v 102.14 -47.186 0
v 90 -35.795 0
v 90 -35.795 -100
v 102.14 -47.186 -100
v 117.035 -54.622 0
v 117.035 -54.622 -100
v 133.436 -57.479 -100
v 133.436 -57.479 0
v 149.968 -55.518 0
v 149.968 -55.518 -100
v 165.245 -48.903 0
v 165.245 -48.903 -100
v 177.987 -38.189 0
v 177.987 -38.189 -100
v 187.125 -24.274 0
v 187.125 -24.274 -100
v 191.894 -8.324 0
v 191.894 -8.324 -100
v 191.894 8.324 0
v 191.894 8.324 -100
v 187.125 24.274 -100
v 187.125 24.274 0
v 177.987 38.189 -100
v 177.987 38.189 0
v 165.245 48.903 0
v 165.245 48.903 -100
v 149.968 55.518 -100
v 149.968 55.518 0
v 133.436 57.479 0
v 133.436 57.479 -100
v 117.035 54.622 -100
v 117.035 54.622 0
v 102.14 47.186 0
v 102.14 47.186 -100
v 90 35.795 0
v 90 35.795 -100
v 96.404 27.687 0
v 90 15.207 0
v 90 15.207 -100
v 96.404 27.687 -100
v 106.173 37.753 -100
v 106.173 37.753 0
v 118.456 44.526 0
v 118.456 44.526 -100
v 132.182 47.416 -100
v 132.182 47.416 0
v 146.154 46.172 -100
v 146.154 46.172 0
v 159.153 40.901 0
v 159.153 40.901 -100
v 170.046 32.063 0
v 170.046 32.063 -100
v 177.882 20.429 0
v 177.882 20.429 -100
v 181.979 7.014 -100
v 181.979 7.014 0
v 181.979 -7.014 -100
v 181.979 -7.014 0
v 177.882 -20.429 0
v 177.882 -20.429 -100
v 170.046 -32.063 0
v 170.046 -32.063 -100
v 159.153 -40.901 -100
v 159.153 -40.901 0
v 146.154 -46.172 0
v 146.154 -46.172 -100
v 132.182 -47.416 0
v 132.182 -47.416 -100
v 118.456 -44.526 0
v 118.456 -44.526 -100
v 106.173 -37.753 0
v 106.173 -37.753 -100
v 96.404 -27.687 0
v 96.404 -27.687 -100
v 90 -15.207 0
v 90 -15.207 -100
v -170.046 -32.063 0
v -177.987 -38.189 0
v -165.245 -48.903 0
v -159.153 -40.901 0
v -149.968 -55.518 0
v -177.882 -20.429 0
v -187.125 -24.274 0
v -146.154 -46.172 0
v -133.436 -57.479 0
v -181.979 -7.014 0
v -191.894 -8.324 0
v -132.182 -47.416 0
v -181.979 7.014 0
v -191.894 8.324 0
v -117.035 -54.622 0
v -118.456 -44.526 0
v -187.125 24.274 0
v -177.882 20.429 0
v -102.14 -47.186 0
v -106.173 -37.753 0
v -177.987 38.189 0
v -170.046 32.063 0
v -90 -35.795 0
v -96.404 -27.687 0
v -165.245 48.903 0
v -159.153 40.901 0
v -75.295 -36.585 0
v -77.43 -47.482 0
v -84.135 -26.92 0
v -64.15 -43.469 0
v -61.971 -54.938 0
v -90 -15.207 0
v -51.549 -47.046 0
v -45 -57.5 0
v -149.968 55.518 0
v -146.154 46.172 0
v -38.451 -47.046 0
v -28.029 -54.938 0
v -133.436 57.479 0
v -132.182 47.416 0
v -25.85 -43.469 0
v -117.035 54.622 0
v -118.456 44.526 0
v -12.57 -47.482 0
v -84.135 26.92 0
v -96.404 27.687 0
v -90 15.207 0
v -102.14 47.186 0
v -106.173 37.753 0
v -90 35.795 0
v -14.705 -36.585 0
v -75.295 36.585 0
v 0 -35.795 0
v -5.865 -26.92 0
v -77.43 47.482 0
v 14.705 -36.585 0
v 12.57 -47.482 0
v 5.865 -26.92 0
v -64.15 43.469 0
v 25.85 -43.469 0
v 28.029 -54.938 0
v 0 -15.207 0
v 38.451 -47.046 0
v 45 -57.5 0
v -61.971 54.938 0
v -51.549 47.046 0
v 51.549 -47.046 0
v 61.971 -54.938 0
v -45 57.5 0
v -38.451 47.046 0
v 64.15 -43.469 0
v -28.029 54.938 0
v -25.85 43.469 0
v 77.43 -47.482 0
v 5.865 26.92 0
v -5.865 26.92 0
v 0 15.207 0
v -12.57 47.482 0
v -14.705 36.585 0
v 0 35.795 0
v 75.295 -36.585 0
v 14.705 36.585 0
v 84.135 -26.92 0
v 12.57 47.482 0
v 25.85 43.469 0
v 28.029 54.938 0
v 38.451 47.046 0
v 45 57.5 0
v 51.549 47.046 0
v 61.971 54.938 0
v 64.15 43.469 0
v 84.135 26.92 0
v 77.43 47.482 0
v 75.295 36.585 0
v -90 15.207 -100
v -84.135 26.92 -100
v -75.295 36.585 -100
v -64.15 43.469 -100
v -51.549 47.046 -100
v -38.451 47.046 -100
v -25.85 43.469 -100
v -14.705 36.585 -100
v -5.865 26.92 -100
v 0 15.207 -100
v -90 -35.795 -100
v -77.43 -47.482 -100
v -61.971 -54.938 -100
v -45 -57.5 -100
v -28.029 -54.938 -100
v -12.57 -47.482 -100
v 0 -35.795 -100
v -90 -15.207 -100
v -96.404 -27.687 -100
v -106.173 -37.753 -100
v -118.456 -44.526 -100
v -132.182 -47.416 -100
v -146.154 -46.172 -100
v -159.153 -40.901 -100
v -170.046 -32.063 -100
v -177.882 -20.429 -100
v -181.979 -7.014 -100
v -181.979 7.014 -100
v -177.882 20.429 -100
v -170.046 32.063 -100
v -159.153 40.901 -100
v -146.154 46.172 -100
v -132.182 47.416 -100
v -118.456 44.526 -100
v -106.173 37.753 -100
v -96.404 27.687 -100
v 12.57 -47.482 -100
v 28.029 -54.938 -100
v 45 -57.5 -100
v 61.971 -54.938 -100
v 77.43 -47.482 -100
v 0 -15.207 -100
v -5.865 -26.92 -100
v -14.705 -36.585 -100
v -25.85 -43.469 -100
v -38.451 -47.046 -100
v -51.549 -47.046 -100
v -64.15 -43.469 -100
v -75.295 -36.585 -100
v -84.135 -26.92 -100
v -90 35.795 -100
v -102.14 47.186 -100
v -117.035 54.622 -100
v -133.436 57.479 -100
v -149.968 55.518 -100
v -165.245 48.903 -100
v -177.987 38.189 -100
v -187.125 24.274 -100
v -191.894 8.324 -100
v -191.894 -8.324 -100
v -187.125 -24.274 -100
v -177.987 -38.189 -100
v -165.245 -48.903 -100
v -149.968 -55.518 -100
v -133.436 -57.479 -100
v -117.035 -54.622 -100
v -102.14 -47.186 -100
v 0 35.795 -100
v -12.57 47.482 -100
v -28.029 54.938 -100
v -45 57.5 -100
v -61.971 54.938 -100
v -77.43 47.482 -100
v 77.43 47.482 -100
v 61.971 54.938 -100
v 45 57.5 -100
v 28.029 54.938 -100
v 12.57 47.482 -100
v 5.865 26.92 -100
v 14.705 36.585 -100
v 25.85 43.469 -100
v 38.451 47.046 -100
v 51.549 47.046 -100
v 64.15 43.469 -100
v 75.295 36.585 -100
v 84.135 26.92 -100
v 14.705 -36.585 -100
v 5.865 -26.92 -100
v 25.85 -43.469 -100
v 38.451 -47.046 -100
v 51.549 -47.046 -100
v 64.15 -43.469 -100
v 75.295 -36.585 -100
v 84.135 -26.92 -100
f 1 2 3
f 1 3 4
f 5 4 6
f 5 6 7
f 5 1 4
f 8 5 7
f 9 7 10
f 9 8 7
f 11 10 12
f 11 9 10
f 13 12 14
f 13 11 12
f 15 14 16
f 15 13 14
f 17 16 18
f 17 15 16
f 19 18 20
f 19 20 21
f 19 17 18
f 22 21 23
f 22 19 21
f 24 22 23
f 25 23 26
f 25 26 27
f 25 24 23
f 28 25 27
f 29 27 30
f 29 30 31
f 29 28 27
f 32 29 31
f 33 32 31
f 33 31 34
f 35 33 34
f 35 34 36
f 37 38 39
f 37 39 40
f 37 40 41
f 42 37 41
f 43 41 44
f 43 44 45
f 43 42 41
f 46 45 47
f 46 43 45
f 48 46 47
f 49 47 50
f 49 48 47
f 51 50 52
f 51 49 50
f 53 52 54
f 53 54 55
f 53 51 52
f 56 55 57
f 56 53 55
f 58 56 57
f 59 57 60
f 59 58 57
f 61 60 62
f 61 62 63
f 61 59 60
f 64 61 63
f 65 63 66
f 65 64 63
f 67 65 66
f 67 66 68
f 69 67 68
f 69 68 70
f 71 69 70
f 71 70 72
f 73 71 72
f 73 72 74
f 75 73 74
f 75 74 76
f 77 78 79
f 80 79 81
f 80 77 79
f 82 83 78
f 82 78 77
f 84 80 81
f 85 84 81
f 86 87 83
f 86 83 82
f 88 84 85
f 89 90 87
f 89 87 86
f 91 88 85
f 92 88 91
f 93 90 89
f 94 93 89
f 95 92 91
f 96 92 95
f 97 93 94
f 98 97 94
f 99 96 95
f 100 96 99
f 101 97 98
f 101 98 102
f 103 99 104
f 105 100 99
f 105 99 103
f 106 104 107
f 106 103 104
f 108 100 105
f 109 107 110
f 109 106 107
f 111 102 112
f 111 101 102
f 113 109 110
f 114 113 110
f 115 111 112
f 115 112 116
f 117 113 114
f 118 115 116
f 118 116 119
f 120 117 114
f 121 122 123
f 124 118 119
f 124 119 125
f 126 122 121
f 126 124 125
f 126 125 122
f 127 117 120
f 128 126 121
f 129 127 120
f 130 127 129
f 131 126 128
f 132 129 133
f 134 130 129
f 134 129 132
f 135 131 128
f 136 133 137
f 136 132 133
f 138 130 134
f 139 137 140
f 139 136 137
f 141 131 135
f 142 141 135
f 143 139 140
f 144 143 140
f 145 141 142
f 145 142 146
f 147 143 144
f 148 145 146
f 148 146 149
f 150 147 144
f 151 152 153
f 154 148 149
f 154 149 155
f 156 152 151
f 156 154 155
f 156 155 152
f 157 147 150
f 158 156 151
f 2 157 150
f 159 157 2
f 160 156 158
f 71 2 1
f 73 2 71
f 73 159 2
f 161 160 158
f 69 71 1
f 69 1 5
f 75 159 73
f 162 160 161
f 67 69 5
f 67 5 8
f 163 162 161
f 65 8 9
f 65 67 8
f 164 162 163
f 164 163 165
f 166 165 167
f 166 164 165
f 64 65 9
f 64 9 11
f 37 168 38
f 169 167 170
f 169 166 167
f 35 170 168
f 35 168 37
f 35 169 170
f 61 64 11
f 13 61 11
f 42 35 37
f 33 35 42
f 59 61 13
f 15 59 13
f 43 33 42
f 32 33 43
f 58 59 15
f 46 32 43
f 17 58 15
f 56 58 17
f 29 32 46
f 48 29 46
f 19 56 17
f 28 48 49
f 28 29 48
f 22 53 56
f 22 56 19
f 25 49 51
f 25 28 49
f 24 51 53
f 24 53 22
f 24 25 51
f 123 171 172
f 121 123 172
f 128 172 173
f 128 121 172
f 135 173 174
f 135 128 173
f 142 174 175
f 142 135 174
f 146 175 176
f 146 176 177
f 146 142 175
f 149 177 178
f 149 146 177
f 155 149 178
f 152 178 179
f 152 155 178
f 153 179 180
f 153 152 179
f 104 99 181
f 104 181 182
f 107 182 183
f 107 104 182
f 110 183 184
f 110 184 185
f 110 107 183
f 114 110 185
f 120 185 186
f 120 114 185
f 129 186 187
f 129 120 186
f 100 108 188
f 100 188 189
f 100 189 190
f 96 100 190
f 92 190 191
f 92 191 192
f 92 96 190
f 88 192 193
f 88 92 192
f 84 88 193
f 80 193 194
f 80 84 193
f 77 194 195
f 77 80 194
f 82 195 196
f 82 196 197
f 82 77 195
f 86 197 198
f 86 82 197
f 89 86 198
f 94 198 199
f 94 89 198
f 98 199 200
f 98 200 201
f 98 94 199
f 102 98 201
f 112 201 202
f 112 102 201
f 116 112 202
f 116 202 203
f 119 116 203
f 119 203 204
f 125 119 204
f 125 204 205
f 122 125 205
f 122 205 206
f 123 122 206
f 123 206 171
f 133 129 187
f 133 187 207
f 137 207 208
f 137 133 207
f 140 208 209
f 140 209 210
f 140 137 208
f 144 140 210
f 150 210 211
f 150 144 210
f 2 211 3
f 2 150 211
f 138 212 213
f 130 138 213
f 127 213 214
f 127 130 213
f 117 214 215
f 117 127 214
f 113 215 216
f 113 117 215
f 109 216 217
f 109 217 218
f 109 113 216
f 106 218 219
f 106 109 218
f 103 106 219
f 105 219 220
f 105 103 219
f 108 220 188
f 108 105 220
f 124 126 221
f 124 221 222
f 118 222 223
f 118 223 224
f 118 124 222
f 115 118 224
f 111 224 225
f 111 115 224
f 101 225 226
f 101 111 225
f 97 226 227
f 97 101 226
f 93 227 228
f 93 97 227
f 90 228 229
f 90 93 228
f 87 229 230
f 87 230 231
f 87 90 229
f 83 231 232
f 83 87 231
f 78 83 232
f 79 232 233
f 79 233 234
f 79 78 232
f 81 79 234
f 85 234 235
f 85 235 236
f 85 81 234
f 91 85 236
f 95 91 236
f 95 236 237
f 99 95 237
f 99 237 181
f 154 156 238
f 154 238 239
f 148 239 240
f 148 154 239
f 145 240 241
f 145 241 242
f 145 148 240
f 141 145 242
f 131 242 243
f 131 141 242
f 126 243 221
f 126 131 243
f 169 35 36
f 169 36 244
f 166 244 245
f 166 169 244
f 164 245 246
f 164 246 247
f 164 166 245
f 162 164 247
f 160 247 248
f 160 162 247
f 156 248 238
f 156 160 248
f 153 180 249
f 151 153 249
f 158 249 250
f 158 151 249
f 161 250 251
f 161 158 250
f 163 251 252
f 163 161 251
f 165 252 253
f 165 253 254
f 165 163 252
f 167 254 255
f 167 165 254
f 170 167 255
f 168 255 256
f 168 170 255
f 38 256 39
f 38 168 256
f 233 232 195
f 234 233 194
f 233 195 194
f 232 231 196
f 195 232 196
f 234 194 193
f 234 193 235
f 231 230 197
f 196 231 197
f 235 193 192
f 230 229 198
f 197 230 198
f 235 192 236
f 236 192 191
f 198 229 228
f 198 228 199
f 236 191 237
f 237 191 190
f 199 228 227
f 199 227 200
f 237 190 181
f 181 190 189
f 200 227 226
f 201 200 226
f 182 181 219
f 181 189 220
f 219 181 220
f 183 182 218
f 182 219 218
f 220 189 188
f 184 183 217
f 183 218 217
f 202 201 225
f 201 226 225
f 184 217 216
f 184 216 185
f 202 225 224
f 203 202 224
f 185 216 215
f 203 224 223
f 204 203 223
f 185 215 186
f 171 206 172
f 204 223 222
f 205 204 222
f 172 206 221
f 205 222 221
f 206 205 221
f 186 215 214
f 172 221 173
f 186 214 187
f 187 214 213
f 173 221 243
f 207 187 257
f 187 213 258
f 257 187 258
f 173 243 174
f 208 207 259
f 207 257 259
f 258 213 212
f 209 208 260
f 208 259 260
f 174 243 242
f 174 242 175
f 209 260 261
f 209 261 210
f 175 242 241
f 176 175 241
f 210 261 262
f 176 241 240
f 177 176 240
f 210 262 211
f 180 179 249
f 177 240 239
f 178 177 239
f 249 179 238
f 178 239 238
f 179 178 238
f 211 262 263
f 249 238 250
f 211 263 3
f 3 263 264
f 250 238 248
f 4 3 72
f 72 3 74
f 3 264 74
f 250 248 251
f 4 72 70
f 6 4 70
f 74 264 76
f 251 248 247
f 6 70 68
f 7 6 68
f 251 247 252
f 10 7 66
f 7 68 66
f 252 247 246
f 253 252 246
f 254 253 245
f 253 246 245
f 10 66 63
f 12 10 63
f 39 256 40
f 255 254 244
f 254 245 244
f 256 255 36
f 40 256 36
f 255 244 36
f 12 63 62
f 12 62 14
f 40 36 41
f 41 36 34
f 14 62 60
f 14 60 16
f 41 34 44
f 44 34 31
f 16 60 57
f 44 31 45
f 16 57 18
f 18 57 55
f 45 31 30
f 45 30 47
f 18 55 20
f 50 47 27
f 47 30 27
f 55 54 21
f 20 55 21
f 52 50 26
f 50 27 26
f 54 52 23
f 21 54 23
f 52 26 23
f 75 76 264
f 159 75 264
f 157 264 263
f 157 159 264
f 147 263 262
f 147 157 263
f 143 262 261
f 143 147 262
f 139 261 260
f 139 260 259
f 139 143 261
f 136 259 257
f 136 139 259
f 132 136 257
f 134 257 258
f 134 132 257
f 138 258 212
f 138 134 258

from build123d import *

# Parameters (mm, degrees)
F1_DEPTH = 100


with BuildPart() as f1:
    # F0 (on Top) → F1 (new body)
    with BuildSketch(Plane.XY):
        with BuildLine():
            ThreePointArc((0, 35.794553), (-45, 57.5), (-90, 35.794553))
            ThreePointArc((-90, 35.794553), (-192.5, 0), (-90, -35.794553))
            ThreePointArc((-90, -35.794553), (-45, -57.5), (0, -35.794553))
            ThreePointArc((0, -35.794553), (45, -57.5), (90, -35.794553))
            ThreePointArc((90, -35.794553), (192.5, 0), (90, 35.794553))
            ThreePointArc((90, 35.794553), (45, 57.5), (0, 35.794553))
        make_face()
        with BuildLine():
            ThreePointArc((-90, -15.206906), (-182.5, 0), (-90, 15.206906))
            ThreePointArc((-90, 15.206906), (-45, 47.5), (0, 15.206906))
            ThreePointArc((0, 15.206906), (45, 47.5), (90, 15.206906))
            ThreePointArc((90, 15.206906), (182.5, 0), (90, -15.206906))
            ThreePointArc((90, -15.206906), (45, -47.5), (0, -15.206906))
            ThreePointArc((0, -15.206906), (-45, -47.5), (-90, -15.206906))
        make_face(mode=Mode.SUBTRACT)
    extrude(amount=-F1_DEPTH)


solid = f1.part
